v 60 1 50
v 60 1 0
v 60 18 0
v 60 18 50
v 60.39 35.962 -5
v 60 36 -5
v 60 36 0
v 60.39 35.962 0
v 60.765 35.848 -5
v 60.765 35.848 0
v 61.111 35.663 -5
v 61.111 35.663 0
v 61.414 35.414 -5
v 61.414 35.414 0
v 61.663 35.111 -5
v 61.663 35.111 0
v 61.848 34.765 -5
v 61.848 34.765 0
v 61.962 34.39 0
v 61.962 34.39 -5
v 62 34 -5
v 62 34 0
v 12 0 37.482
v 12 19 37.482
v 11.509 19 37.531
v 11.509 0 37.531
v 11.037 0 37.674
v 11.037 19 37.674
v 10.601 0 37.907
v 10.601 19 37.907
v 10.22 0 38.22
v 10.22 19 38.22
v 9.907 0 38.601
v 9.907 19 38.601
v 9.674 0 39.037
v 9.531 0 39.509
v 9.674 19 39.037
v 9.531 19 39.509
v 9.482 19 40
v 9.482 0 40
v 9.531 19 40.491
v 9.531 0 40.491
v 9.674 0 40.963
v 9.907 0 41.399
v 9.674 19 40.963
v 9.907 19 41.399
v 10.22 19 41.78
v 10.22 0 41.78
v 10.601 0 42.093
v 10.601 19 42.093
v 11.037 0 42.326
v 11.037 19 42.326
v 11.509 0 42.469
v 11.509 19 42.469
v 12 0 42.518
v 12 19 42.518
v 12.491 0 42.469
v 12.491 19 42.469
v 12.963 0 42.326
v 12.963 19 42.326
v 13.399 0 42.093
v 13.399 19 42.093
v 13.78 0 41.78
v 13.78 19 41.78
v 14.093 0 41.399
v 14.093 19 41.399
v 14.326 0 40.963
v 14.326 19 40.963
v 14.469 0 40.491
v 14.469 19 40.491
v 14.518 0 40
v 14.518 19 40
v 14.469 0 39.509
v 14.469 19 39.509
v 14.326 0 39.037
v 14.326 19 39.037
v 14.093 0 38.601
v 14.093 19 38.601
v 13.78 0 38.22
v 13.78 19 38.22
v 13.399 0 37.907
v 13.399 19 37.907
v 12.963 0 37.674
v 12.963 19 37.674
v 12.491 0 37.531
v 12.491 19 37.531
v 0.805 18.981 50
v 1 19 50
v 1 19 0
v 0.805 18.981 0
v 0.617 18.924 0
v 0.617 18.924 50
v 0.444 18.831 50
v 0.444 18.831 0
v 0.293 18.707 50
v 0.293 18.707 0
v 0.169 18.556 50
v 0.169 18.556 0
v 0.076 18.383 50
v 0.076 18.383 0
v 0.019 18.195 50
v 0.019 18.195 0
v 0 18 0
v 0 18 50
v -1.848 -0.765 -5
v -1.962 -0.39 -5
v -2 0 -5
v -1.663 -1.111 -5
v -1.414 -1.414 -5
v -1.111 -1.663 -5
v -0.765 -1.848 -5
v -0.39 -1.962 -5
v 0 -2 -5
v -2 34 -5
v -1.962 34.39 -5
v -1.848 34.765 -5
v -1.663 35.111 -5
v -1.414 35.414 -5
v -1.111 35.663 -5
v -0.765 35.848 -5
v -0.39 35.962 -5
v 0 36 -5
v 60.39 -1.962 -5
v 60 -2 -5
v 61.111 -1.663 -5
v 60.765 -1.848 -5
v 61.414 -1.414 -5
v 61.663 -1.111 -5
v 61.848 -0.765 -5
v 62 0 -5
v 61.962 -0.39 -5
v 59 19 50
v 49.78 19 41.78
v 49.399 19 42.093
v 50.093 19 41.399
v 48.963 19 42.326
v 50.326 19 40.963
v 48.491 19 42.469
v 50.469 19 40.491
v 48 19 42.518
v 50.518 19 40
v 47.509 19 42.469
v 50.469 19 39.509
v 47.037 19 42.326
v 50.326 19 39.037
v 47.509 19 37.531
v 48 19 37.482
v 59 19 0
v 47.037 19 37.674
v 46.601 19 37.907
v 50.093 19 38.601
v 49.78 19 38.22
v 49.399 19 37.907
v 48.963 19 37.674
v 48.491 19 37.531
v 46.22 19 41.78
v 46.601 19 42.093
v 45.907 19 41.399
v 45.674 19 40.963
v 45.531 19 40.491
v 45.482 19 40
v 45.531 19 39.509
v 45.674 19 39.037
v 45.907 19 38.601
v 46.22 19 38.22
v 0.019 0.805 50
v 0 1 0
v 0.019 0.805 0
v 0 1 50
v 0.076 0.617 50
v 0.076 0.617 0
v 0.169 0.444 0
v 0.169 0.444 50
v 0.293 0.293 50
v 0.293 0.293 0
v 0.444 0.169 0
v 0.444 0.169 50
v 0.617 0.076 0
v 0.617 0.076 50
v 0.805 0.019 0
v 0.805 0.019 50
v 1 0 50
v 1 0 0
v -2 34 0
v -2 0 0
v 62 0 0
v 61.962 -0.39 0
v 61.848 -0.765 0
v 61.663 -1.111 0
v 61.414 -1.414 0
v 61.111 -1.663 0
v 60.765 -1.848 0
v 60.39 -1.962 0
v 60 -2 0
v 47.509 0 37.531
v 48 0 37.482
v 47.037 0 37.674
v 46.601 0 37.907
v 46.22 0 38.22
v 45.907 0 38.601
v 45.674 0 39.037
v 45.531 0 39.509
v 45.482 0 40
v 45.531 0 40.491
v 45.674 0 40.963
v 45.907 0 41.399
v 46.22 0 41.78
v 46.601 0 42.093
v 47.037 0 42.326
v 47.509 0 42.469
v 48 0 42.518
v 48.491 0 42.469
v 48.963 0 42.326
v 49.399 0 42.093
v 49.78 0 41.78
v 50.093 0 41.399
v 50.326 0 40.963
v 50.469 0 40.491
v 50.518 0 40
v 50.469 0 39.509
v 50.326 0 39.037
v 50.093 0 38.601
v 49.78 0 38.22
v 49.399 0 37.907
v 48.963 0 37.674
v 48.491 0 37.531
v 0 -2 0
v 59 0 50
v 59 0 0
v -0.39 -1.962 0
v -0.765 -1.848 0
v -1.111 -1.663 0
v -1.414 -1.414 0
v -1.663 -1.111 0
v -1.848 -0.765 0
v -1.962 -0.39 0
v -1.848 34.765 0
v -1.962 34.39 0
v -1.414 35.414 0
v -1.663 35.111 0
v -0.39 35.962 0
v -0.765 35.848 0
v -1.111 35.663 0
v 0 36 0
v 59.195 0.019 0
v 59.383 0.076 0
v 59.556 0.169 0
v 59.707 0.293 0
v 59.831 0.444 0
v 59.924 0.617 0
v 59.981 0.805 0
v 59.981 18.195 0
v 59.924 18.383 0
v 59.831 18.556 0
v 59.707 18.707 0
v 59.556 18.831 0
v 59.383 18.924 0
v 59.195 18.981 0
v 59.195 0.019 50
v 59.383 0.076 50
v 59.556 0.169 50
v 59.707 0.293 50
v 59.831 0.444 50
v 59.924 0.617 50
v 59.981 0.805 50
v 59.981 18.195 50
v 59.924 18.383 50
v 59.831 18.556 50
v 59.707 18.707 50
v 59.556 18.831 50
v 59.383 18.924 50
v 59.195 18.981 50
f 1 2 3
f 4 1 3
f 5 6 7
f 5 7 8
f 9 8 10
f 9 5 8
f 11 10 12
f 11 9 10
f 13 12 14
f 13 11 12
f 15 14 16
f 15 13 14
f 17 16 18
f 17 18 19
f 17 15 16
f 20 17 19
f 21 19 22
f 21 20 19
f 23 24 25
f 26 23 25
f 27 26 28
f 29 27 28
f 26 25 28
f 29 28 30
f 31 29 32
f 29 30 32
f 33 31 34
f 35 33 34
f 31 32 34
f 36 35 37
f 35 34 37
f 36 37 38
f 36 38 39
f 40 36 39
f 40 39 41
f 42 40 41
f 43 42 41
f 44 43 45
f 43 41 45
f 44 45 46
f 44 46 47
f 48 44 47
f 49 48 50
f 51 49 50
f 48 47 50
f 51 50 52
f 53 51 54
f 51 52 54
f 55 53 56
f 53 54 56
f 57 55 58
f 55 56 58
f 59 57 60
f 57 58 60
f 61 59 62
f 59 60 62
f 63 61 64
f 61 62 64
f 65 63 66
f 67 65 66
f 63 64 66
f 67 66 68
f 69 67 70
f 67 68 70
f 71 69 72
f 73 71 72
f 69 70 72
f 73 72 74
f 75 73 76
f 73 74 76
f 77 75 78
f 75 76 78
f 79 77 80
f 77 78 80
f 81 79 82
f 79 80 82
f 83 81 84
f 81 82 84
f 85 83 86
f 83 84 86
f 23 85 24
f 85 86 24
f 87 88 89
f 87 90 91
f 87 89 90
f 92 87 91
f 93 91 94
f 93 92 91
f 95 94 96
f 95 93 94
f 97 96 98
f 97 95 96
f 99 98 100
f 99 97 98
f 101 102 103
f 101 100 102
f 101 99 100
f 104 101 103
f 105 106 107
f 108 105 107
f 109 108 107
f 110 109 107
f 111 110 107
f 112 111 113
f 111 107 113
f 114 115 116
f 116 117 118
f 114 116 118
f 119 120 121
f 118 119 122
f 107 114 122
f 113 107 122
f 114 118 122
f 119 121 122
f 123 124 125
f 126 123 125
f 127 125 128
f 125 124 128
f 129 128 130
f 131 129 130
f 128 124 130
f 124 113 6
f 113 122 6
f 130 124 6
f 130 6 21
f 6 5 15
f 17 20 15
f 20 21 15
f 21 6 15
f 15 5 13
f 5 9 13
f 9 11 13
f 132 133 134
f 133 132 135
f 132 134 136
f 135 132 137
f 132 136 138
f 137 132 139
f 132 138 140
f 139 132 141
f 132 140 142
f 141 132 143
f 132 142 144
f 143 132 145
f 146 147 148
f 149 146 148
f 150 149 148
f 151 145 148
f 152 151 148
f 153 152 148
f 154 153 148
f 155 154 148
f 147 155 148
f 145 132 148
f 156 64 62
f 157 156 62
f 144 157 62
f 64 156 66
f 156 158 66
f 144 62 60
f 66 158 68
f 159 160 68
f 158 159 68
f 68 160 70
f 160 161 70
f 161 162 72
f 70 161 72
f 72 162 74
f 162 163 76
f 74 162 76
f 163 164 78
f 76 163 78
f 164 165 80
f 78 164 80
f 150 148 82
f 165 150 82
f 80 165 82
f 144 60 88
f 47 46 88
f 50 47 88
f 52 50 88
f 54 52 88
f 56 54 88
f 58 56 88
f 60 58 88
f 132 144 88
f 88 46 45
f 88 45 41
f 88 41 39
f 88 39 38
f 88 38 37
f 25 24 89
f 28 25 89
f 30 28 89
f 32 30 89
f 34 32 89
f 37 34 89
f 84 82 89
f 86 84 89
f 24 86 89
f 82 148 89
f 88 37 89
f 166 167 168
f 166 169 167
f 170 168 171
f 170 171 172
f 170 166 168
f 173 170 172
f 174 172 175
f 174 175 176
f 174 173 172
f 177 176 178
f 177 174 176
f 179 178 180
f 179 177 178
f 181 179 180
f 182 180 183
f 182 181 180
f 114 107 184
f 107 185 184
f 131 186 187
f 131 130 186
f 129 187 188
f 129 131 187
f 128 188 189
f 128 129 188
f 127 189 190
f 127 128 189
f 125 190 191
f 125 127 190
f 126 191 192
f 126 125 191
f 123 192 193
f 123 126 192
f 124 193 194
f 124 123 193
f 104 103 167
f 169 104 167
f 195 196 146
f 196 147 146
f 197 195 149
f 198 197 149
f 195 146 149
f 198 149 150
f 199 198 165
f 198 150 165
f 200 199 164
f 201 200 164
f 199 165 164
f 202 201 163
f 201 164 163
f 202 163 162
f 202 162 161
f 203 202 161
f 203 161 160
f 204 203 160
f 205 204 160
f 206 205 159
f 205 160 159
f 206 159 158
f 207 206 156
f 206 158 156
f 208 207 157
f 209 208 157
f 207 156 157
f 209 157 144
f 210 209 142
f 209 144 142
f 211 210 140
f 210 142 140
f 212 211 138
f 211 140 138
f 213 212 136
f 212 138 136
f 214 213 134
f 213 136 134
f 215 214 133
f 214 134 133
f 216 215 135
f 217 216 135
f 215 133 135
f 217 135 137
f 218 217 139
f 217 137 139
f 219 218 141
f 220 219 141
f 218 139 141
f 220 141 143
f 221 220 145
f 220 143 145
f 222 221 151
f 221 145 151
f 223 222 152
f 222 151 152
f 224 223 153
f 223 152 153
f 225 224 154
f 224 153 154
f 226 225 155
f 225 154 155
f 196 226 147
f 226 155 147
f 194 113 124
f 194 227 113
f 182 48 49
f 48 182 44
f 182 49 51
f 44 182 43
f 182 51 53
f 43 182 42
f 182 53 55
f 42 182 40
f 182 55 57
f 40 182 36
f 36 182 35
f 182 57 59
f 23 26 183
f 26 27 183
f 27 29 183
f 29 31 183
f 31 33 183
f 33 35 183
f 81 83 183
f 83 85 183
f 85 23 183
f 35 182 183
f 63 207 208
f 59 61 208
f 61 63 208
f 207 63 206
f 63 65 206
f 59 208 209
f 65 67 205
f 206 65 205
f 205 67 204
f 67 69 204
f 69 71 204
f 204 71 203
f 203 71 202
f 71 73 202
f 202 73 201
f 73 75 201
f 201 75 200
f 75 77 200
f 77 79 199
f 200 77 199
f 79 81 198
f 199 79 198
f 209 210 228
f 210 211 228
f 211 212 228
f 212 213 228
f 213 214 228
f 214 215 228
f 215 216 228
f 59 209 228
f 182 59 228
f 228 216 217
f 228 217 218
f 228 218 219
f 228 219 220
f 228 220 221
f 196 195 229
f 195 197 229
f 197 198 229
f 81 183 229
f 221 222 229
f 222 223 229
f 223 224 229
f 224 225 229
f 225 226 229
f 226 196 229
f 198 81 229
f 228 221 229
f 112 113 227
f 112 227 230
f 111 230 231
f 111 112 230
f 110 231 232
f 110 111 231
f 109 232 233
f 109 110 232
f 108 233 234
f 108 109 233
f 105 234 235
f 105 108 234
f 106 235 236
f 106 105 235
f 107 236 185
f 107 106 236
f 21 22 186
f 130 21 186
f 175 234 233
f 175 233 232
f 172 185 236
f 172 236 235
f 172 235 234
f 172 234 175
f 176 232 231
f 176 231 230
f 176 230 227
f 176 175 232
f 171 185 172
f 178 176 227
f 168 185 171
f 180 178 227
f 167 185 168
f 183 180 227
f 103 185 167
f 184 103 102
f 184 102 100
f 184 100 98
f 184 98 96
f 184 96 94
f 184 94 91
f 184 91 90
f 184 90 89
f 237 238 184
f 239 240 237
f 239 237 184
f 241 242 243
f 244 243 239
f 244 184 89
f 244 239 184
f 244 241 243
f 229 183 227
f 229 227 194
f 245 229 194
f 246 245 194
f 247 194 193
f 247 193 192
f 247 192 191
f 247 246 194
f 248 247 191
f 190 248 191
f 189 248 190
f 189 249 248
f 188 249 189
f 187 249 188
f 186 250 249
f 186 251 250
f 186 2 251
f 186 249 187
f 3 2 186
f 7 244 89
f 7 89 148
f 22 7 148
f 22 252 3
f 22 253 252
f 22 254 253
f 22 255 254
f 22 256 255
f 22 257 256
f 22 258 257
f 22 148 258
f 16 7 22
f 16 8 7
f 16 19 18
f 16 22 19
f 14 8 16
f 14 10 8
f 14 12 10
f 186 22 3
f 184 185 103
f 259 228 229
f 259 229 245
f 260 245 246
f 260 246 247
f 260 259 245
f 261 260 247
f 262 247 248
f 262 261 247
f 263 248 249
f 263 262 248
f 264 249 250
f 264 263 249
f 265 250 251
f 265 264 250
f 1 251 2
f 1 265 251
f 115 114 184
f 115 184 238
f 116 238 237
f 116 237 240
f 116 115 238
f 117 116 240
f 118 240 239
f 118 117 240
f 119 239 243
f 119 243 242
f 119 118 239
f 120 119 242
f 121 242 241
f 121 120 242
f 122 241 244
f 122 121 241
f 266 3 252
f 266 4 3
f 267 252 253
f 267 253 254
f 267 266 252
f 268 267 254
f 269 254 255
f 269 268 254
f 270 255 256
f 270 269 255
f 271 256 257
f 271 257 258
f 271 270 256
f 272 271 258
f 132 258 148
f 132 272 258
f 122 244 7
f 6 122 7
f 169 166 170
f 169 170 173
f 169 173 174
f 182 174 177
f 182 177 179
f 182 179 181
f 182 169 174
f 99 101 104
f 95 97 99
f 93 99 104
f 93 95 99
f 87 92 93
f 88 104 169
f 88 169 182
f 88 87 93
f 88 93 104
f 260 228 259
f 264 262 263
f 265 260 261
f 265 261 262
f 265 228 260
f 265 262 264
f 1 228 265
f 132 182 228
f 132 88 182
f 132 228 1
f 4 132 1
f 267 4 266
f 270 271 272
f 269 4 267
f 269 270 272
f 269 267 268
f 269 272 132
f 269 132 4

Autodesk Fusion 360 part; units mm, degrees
sketch "Sketch1" plane through (0, 0, 0) normal (0, 0, 1) x (1, 0, 0)
  line L0 (0, 0) -> (60, 0)
  line L1 (60, 0) -> (60, 19)
  line L2 (60, 19) -> (0, 19)
  line L3 (0, 19) -> (0, 0)
  line L4 (0, 19) -> (0, 34)
  line L5 (0, 34) -> (60, 34)
  line L6 (60, 34) -> (60, 19)
  line L7 (60, 19) -> (0, 19)
  line L8 (-2, 19) -> (-2, 36)
  line L9 (-2, 36) -> (62, 36)
  line L10 (62, 36) -> (62, 19)
  line L11 (62, -2) -> (62, 19)
  line L12 (-2, -2) -> (62, -2)
  line L13 (-2, 19) -> (-2, -2)
  dimension "d1" = 60
  dimension "d2" = 19
  dimension "d3" = 15
  dimension "d4" = 2
extrude "Extrude1" add sketch "Sketch1" along normal blind 50 contours L0 L1 L2 L3 L7
extrude "Extrude2" add sketch "Sketch1" against normal blind 5 contours L0 L1 L2 L3 L7 | L2 L4 L5 L6 L7 | L8 L9 L10 L11 L12 L13
sketch "Sketch2" plane through (0, 0, 0) normal (0, -1, 0) x (1, 0, 0)
  line L0 (0, 0) -> (60, 0)
  line L1 (60, 0) -> (60, 50)
  line L2 (60, 50) -> (0, 50)
  line L3 (0, 50) -> (0, 0)
  circle A0 centre (12, 40) radius 3
  circle A1 centre (48, 40) radius 3
  dimension "d11" = 6
  dimension "d12" = 6
  dimension "d13" = 12
  dimension "d14" = 10
  dimension "d15" = 10
  dimension "d16" = 12
hole "Hole1" at (12, 0, 40) direction (0, 1, 0) diameter 5.035 depth 19 tip angle 118
hole "Hole2" at (48, 0, 40) direction (0, 1, 0) diameter 5.035 depth 19 tip angle 118
fillet "Fillet1" radius 2 4 edges at (62, 36, -2.5) (-2, 36, -2.5) (62, -2, -2.5) (-2, -2, -2.5)
fillet "Fillet2" radius 1 4 edges at (0, 0, 25) (0, 19, 25) (60, 0, 25) (60, 19, 25)
